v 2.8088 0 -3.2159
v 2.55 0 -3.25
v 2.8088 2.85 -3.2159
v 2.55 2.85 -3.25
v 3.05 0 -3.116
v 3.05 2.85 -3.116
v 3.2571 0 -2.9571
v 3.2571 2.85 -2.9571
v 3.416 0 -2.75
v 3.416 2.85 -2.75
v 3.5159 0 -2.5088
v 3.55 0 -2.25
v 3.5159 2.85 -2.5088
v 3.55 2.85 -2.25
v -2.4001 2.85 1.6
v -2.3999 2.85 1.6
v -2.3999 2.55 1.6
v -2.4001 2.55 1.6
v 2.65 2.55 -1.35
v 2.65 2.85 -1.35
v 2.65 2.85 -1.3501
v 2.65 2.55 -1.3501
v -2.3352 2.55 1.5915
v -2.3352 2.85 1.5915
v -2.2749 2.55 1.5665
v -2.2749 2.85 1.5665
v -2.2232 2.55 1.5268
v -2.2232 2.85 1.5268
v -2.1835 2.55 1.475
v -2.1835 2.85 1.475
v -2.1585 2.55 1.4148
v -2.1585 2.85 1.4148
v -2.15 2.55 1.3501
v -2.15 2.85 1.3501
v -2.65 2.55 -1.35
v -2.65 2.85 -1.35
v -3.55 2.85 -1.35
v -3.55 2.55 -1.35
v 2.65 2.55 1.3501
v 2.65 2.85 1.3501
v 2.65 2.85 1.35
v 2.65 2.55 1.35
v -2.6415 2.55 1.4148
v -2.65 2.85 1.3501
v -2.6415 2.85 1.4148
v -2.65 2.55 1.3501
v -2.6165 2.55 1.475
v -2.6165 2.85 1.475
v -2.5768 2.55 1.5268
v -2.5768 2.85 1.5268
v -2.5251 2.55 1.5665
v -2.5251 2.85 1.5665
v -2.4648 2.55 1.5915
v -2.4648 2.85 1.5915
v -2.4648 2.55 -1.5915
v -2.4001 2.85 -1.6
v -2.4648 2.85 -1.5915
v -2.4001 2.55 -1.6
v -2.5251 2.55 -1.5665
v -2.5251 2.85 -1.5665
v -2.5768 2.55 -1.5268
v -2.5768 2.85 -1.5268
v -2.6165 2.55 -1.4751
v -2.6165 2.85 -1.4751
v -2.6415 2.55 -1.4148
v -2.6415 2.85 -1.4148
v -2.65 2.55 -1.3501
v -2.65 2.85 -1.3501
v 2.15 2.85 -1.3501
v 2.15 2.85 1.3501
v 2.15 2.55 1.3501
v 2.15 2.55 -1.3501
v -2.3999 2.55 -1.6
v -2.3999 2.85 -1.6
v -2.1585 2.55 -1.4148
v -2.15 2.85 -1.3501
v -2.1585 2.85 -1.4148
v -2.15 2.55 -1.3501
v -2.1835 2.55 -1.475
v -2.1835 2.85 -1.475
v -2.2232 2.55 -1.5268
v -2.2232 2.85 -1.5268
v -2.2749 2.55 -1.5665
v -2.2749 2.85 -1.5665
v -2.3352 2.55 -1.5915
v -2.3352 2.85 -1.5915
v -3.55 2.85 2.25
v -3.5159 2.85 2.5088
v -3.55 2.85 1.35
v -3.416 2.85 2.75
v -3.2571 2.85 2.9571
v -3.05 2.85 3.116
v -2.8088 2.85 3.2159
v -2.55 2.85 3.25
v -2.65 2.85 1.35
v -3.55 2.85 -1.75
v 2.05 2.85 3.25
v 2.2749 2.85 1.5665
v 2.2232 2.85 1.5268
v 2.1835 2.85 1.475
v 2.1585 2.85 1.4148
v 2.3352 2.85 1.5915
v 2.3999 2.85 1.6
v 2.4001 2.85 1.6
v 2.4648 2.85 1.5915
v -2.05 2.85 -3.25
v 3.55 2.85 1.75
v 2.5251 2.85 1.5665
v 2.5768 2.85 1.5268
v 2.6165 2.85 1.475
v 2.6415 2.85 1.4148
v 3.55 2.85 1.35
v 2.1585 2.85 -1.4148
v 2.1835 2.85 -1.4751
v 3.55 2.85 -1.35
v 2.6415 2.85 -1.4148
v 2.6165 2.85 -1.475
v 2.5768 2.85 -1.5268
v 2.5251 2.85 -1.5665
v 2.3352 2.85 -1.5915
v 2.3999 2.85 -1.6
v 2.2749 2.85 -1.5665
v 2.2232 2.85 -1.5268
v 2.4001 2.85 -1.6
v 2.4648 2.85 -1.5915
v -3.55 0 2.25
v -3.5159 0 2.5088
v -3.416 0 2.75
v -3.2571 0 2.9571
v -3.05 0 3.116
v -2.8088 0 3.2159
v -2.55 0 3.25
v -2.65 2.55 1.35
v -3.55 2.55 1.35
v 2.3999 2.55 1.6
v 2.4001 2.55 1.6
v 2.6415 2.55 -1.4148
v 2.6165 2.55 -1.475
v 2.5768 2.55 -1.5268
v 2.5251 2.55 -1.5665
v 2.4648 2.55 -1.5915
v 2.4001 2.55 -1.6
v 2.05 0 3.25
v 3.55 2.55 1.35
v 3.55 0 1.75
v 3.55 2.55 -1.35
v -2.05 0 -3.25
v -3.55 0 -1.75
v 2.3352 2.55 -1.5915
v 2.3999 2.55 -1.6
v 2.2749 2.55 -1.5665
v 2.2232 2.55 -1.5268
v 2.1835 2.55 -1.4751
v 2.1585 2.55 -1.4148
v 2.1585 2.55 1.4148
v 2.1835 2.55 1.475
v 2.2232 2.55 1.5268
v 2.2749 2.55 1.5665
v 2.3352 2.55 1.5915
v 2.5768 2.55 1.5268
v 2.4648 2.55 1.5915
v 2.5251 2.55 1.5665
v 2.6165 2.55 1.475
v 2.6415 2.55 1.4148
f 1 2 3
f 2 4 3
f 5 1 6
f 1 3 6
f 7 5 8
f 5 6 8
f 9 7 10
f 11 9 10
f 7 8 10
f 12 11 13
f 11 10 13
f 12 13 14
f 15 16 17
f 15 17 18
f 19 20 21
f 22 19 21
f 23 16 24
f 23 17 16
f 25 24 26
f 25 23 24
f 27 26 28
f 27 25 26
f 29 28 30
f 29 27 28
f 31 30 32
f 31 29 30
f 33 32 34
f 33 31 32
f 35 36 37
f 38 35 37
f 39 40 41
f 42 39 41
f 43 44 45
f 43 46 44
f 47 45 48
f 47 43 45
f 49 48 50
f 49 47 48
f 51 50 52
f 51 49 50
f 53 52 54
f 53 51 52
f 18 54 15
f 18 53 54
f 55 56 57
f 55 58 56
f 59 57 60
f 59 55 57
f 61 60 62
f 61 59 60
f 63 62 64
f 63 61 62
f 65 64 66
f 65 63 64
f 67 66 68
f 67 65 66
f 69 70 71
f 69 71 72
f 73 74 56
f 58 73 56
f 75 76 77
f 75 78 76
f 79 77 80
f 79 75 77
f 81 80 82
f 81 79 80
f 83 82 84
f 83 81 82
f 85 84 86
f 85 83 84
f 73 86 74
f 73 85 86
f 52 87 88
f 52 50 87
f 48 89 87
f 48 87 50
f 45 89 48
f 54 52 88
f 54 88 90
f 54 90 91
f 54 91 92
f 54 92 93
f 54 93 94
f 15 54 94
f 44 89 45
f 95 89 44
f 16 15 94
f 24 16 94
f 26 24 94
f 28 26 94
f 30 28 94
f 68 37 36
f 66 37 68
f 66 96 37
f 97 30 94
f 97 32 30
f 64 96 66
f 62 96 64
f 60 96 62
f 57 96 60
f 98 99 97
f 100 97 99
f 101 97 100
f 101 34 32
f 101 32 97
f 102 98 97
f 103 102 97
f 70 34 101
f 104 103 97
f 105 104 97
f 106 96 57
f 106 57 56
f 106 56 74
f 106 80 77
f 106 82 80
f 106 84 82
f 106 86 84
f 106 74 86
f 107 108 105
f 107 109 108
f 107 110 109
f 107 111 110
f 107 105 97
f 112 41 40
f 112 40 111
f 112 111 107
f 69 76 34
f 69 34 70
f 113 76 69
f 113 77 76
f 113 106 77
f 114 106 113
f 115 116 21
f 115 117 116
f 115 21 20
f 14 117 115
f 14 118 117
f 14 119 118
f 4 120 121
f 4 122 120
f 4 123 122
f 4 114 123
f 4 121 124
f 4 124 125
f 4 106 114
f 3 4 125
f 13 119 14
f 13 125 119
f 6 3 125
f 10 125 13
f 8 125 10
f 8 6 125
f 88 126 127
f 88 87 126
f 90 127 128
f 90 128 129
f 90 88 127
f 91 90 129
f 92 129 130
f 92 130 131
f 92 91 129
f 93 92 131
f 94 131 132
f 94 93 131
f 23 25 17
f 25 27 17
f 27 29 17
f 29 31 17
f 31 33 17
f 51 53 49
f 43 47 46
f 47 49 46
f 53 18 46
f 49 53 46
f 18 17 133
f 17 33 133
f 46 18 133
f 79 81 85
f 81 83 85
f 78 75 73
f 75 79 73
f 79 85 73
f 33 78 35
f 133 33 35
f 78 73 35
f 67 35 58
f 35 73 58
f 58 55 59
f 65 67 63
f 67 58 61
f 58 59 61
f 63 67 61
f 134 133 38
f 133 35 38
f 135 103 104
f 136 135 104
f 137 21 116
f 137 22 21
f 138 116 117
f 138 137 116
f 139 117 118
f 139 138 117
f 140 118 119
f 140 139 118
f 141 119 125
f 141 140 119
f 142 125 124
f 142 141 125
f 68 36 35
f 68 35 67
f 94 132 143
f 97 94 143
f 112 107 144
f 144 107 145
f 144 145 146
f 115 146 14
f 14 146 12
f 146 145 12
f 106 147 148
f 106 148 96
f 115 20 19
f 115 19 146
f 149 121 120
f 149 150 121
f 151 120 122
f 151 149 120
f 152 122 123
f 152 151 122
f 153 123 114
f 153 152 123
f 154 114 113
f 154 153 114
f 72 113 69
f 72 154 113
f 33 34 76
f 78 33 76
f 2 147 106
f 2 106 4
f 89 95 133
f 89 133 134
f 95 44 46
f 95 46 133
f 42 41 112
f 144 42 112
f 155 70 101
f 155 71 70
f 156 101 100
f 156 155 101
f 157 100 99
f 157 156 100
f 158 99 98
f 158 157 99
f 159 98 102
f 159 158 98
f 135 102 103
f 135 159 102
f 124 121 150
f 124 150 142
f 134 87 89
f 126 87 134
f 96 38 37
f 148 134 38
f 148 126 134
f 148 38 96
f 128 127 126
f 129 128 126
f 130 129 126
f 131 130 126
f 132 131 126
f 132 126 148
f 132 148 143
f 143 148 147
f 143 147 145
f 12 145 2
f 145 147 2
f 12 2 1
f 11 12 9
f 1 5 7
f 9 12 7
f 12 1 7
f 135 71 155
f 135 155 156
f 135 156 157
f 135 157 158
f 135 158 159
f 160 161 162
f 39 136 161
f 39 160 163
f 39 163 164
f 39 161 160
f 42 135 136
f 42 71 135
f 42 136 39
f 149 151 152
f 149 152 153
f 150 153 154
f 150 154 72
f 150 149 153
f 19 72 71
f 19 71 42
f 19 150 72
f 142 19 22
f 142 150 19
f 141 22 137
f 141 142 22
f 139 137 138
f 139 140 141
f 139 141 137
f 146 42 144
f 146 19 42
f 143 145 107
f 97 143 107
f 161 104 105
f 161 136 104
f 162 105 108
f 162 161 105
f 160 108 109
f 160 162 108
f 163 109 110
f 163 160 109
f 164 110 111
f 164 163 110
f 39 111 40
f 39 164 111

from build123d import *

# Parameters (mm, degrees)
SKETCH1_W            = 7.1
SKETCH1_H            = 6.5
BOSS_EXTRUDE1_DEPTH  = 2.85
CHAMFER1_SIZE        = 1.5
FILLET1_R            = 1
SKETCH2_W            = 0.9
SKETCH2_H            = 2.7
CUT_EXTRUDE1_DEPTH   = 0.3
SKETCH3_W            = 0.5
SKETCH3_H            = 3.2
CUT_EXTRUDE2_DEPTH   = 0.3
FILLET2_R            = 0.25
FILLET2_OF_MIRROR1_R = 0.25


with BuildPart() as part:
    # Sketch1 → Boss-Extrude1 (new body)
    with BuildSketch(Plane(origin=(0, 0, 0), x_dir=(1, 0, 0), z_dir=(0, 1, 0))):
        Rectangle(SKETCH1_W, SKETCH1_H)
    extrude(amount=BOSS_EXTRUDE1_DEPTH)

    # Chamfer1
    chamfer1_edges = [part.edges().sort_by_distance(p)[0] for p in [
        (3.55, 1.425, 3.25),
        (-3.55, 1.425, -3.25),
    ]]
    chamfer(chamfer1_edges, length=CHAMFER1_SIZE)

    # Fillet1
    fillet1_edges = [part.edges().sort_by_distance(p)[0] for p in [
        (-3.55, 1.425, 3.25),
        (3.55, 1.425, -3.25),
    ]]
    fillet(fillet1_edges, radius=FILLET1_R)

    # Sketch2 → Cut-Extrude1 (cut)
    with BuildSketch(Plane(origin=(0, 2.85, 0), x_dir=(1, 0, 0), z_dir=(0, 1, 0))):
        with Locations((3.1, 0)):
            Rectangle(SKETCH2_W, SKETCH2_H)
    cut_extrude1 = extrude(amount=-CUT_EXTRUDE1_DEPTH, mode=Mode.SUBTRACT)

    # Sketch3 → Cut-Extrude2 (cut)
    with BuildSketch(Plane(origin=(0, 2.85, 0), x_dir=(1, 0, 0), z_dir=(0, 1, 0))):
        with Locations((2.4, 0)):
            Rectangle(SKETCH3_W, SKETCH3_H)
    cut_extrude2 = extrude(amount=-CUT_EXTRUDE2_DEPTH, mode=Mode.SUBTRACT)

    # Fillet2
    fillet2_edges = [part.edges().sort_by_distance(p)[0] for p in [
        (2.65, 2.7, 1.6),
        (2.15, 2.7, 1.6),
        (2.65, 2.7, -1.6),
        (2.15, 2.7, -1.6),
    ]]
    fillet(fillet2_edges, radius=FILLET2_R - 0.0001)  # a hair under: the kernel refuses the full size

    # Mirror1: Cut-Extrude1, Cut-Extrude2 across plane
    add(cut_extrude1.mirror(Plane(origin=(0, 0, 0), x_dir=(0, 0, 1), z_dir=(1, 0, 0))), mode=Mode.SUBTRACT)
    add(cut_extrude2.mirror(Plane(origin=(0, 0, 0), x_dir=(0, 0, 1), z_dir=(1, 0, 0))), mode=Mode.SUBTRACT)

    # Fillet2 of Mirror1
    fillet2_of_mirror1_edges = [part.edges().sort_by_distance(p)[0] for p in [
        (-2.65, 2.7, 1.6),
        (-2.15, 2.7, 1.6),
        (-2.65, 2.7, -1.6),
        (-2.15, 2.7, -1.6),
    ]]
    fillet(fillet2_of_mirror1_edges, radius=FILLET2_OF_MIRROR1_R - 0.0001)  # a hair under: the kernel refuses the full size


solid = part.part
